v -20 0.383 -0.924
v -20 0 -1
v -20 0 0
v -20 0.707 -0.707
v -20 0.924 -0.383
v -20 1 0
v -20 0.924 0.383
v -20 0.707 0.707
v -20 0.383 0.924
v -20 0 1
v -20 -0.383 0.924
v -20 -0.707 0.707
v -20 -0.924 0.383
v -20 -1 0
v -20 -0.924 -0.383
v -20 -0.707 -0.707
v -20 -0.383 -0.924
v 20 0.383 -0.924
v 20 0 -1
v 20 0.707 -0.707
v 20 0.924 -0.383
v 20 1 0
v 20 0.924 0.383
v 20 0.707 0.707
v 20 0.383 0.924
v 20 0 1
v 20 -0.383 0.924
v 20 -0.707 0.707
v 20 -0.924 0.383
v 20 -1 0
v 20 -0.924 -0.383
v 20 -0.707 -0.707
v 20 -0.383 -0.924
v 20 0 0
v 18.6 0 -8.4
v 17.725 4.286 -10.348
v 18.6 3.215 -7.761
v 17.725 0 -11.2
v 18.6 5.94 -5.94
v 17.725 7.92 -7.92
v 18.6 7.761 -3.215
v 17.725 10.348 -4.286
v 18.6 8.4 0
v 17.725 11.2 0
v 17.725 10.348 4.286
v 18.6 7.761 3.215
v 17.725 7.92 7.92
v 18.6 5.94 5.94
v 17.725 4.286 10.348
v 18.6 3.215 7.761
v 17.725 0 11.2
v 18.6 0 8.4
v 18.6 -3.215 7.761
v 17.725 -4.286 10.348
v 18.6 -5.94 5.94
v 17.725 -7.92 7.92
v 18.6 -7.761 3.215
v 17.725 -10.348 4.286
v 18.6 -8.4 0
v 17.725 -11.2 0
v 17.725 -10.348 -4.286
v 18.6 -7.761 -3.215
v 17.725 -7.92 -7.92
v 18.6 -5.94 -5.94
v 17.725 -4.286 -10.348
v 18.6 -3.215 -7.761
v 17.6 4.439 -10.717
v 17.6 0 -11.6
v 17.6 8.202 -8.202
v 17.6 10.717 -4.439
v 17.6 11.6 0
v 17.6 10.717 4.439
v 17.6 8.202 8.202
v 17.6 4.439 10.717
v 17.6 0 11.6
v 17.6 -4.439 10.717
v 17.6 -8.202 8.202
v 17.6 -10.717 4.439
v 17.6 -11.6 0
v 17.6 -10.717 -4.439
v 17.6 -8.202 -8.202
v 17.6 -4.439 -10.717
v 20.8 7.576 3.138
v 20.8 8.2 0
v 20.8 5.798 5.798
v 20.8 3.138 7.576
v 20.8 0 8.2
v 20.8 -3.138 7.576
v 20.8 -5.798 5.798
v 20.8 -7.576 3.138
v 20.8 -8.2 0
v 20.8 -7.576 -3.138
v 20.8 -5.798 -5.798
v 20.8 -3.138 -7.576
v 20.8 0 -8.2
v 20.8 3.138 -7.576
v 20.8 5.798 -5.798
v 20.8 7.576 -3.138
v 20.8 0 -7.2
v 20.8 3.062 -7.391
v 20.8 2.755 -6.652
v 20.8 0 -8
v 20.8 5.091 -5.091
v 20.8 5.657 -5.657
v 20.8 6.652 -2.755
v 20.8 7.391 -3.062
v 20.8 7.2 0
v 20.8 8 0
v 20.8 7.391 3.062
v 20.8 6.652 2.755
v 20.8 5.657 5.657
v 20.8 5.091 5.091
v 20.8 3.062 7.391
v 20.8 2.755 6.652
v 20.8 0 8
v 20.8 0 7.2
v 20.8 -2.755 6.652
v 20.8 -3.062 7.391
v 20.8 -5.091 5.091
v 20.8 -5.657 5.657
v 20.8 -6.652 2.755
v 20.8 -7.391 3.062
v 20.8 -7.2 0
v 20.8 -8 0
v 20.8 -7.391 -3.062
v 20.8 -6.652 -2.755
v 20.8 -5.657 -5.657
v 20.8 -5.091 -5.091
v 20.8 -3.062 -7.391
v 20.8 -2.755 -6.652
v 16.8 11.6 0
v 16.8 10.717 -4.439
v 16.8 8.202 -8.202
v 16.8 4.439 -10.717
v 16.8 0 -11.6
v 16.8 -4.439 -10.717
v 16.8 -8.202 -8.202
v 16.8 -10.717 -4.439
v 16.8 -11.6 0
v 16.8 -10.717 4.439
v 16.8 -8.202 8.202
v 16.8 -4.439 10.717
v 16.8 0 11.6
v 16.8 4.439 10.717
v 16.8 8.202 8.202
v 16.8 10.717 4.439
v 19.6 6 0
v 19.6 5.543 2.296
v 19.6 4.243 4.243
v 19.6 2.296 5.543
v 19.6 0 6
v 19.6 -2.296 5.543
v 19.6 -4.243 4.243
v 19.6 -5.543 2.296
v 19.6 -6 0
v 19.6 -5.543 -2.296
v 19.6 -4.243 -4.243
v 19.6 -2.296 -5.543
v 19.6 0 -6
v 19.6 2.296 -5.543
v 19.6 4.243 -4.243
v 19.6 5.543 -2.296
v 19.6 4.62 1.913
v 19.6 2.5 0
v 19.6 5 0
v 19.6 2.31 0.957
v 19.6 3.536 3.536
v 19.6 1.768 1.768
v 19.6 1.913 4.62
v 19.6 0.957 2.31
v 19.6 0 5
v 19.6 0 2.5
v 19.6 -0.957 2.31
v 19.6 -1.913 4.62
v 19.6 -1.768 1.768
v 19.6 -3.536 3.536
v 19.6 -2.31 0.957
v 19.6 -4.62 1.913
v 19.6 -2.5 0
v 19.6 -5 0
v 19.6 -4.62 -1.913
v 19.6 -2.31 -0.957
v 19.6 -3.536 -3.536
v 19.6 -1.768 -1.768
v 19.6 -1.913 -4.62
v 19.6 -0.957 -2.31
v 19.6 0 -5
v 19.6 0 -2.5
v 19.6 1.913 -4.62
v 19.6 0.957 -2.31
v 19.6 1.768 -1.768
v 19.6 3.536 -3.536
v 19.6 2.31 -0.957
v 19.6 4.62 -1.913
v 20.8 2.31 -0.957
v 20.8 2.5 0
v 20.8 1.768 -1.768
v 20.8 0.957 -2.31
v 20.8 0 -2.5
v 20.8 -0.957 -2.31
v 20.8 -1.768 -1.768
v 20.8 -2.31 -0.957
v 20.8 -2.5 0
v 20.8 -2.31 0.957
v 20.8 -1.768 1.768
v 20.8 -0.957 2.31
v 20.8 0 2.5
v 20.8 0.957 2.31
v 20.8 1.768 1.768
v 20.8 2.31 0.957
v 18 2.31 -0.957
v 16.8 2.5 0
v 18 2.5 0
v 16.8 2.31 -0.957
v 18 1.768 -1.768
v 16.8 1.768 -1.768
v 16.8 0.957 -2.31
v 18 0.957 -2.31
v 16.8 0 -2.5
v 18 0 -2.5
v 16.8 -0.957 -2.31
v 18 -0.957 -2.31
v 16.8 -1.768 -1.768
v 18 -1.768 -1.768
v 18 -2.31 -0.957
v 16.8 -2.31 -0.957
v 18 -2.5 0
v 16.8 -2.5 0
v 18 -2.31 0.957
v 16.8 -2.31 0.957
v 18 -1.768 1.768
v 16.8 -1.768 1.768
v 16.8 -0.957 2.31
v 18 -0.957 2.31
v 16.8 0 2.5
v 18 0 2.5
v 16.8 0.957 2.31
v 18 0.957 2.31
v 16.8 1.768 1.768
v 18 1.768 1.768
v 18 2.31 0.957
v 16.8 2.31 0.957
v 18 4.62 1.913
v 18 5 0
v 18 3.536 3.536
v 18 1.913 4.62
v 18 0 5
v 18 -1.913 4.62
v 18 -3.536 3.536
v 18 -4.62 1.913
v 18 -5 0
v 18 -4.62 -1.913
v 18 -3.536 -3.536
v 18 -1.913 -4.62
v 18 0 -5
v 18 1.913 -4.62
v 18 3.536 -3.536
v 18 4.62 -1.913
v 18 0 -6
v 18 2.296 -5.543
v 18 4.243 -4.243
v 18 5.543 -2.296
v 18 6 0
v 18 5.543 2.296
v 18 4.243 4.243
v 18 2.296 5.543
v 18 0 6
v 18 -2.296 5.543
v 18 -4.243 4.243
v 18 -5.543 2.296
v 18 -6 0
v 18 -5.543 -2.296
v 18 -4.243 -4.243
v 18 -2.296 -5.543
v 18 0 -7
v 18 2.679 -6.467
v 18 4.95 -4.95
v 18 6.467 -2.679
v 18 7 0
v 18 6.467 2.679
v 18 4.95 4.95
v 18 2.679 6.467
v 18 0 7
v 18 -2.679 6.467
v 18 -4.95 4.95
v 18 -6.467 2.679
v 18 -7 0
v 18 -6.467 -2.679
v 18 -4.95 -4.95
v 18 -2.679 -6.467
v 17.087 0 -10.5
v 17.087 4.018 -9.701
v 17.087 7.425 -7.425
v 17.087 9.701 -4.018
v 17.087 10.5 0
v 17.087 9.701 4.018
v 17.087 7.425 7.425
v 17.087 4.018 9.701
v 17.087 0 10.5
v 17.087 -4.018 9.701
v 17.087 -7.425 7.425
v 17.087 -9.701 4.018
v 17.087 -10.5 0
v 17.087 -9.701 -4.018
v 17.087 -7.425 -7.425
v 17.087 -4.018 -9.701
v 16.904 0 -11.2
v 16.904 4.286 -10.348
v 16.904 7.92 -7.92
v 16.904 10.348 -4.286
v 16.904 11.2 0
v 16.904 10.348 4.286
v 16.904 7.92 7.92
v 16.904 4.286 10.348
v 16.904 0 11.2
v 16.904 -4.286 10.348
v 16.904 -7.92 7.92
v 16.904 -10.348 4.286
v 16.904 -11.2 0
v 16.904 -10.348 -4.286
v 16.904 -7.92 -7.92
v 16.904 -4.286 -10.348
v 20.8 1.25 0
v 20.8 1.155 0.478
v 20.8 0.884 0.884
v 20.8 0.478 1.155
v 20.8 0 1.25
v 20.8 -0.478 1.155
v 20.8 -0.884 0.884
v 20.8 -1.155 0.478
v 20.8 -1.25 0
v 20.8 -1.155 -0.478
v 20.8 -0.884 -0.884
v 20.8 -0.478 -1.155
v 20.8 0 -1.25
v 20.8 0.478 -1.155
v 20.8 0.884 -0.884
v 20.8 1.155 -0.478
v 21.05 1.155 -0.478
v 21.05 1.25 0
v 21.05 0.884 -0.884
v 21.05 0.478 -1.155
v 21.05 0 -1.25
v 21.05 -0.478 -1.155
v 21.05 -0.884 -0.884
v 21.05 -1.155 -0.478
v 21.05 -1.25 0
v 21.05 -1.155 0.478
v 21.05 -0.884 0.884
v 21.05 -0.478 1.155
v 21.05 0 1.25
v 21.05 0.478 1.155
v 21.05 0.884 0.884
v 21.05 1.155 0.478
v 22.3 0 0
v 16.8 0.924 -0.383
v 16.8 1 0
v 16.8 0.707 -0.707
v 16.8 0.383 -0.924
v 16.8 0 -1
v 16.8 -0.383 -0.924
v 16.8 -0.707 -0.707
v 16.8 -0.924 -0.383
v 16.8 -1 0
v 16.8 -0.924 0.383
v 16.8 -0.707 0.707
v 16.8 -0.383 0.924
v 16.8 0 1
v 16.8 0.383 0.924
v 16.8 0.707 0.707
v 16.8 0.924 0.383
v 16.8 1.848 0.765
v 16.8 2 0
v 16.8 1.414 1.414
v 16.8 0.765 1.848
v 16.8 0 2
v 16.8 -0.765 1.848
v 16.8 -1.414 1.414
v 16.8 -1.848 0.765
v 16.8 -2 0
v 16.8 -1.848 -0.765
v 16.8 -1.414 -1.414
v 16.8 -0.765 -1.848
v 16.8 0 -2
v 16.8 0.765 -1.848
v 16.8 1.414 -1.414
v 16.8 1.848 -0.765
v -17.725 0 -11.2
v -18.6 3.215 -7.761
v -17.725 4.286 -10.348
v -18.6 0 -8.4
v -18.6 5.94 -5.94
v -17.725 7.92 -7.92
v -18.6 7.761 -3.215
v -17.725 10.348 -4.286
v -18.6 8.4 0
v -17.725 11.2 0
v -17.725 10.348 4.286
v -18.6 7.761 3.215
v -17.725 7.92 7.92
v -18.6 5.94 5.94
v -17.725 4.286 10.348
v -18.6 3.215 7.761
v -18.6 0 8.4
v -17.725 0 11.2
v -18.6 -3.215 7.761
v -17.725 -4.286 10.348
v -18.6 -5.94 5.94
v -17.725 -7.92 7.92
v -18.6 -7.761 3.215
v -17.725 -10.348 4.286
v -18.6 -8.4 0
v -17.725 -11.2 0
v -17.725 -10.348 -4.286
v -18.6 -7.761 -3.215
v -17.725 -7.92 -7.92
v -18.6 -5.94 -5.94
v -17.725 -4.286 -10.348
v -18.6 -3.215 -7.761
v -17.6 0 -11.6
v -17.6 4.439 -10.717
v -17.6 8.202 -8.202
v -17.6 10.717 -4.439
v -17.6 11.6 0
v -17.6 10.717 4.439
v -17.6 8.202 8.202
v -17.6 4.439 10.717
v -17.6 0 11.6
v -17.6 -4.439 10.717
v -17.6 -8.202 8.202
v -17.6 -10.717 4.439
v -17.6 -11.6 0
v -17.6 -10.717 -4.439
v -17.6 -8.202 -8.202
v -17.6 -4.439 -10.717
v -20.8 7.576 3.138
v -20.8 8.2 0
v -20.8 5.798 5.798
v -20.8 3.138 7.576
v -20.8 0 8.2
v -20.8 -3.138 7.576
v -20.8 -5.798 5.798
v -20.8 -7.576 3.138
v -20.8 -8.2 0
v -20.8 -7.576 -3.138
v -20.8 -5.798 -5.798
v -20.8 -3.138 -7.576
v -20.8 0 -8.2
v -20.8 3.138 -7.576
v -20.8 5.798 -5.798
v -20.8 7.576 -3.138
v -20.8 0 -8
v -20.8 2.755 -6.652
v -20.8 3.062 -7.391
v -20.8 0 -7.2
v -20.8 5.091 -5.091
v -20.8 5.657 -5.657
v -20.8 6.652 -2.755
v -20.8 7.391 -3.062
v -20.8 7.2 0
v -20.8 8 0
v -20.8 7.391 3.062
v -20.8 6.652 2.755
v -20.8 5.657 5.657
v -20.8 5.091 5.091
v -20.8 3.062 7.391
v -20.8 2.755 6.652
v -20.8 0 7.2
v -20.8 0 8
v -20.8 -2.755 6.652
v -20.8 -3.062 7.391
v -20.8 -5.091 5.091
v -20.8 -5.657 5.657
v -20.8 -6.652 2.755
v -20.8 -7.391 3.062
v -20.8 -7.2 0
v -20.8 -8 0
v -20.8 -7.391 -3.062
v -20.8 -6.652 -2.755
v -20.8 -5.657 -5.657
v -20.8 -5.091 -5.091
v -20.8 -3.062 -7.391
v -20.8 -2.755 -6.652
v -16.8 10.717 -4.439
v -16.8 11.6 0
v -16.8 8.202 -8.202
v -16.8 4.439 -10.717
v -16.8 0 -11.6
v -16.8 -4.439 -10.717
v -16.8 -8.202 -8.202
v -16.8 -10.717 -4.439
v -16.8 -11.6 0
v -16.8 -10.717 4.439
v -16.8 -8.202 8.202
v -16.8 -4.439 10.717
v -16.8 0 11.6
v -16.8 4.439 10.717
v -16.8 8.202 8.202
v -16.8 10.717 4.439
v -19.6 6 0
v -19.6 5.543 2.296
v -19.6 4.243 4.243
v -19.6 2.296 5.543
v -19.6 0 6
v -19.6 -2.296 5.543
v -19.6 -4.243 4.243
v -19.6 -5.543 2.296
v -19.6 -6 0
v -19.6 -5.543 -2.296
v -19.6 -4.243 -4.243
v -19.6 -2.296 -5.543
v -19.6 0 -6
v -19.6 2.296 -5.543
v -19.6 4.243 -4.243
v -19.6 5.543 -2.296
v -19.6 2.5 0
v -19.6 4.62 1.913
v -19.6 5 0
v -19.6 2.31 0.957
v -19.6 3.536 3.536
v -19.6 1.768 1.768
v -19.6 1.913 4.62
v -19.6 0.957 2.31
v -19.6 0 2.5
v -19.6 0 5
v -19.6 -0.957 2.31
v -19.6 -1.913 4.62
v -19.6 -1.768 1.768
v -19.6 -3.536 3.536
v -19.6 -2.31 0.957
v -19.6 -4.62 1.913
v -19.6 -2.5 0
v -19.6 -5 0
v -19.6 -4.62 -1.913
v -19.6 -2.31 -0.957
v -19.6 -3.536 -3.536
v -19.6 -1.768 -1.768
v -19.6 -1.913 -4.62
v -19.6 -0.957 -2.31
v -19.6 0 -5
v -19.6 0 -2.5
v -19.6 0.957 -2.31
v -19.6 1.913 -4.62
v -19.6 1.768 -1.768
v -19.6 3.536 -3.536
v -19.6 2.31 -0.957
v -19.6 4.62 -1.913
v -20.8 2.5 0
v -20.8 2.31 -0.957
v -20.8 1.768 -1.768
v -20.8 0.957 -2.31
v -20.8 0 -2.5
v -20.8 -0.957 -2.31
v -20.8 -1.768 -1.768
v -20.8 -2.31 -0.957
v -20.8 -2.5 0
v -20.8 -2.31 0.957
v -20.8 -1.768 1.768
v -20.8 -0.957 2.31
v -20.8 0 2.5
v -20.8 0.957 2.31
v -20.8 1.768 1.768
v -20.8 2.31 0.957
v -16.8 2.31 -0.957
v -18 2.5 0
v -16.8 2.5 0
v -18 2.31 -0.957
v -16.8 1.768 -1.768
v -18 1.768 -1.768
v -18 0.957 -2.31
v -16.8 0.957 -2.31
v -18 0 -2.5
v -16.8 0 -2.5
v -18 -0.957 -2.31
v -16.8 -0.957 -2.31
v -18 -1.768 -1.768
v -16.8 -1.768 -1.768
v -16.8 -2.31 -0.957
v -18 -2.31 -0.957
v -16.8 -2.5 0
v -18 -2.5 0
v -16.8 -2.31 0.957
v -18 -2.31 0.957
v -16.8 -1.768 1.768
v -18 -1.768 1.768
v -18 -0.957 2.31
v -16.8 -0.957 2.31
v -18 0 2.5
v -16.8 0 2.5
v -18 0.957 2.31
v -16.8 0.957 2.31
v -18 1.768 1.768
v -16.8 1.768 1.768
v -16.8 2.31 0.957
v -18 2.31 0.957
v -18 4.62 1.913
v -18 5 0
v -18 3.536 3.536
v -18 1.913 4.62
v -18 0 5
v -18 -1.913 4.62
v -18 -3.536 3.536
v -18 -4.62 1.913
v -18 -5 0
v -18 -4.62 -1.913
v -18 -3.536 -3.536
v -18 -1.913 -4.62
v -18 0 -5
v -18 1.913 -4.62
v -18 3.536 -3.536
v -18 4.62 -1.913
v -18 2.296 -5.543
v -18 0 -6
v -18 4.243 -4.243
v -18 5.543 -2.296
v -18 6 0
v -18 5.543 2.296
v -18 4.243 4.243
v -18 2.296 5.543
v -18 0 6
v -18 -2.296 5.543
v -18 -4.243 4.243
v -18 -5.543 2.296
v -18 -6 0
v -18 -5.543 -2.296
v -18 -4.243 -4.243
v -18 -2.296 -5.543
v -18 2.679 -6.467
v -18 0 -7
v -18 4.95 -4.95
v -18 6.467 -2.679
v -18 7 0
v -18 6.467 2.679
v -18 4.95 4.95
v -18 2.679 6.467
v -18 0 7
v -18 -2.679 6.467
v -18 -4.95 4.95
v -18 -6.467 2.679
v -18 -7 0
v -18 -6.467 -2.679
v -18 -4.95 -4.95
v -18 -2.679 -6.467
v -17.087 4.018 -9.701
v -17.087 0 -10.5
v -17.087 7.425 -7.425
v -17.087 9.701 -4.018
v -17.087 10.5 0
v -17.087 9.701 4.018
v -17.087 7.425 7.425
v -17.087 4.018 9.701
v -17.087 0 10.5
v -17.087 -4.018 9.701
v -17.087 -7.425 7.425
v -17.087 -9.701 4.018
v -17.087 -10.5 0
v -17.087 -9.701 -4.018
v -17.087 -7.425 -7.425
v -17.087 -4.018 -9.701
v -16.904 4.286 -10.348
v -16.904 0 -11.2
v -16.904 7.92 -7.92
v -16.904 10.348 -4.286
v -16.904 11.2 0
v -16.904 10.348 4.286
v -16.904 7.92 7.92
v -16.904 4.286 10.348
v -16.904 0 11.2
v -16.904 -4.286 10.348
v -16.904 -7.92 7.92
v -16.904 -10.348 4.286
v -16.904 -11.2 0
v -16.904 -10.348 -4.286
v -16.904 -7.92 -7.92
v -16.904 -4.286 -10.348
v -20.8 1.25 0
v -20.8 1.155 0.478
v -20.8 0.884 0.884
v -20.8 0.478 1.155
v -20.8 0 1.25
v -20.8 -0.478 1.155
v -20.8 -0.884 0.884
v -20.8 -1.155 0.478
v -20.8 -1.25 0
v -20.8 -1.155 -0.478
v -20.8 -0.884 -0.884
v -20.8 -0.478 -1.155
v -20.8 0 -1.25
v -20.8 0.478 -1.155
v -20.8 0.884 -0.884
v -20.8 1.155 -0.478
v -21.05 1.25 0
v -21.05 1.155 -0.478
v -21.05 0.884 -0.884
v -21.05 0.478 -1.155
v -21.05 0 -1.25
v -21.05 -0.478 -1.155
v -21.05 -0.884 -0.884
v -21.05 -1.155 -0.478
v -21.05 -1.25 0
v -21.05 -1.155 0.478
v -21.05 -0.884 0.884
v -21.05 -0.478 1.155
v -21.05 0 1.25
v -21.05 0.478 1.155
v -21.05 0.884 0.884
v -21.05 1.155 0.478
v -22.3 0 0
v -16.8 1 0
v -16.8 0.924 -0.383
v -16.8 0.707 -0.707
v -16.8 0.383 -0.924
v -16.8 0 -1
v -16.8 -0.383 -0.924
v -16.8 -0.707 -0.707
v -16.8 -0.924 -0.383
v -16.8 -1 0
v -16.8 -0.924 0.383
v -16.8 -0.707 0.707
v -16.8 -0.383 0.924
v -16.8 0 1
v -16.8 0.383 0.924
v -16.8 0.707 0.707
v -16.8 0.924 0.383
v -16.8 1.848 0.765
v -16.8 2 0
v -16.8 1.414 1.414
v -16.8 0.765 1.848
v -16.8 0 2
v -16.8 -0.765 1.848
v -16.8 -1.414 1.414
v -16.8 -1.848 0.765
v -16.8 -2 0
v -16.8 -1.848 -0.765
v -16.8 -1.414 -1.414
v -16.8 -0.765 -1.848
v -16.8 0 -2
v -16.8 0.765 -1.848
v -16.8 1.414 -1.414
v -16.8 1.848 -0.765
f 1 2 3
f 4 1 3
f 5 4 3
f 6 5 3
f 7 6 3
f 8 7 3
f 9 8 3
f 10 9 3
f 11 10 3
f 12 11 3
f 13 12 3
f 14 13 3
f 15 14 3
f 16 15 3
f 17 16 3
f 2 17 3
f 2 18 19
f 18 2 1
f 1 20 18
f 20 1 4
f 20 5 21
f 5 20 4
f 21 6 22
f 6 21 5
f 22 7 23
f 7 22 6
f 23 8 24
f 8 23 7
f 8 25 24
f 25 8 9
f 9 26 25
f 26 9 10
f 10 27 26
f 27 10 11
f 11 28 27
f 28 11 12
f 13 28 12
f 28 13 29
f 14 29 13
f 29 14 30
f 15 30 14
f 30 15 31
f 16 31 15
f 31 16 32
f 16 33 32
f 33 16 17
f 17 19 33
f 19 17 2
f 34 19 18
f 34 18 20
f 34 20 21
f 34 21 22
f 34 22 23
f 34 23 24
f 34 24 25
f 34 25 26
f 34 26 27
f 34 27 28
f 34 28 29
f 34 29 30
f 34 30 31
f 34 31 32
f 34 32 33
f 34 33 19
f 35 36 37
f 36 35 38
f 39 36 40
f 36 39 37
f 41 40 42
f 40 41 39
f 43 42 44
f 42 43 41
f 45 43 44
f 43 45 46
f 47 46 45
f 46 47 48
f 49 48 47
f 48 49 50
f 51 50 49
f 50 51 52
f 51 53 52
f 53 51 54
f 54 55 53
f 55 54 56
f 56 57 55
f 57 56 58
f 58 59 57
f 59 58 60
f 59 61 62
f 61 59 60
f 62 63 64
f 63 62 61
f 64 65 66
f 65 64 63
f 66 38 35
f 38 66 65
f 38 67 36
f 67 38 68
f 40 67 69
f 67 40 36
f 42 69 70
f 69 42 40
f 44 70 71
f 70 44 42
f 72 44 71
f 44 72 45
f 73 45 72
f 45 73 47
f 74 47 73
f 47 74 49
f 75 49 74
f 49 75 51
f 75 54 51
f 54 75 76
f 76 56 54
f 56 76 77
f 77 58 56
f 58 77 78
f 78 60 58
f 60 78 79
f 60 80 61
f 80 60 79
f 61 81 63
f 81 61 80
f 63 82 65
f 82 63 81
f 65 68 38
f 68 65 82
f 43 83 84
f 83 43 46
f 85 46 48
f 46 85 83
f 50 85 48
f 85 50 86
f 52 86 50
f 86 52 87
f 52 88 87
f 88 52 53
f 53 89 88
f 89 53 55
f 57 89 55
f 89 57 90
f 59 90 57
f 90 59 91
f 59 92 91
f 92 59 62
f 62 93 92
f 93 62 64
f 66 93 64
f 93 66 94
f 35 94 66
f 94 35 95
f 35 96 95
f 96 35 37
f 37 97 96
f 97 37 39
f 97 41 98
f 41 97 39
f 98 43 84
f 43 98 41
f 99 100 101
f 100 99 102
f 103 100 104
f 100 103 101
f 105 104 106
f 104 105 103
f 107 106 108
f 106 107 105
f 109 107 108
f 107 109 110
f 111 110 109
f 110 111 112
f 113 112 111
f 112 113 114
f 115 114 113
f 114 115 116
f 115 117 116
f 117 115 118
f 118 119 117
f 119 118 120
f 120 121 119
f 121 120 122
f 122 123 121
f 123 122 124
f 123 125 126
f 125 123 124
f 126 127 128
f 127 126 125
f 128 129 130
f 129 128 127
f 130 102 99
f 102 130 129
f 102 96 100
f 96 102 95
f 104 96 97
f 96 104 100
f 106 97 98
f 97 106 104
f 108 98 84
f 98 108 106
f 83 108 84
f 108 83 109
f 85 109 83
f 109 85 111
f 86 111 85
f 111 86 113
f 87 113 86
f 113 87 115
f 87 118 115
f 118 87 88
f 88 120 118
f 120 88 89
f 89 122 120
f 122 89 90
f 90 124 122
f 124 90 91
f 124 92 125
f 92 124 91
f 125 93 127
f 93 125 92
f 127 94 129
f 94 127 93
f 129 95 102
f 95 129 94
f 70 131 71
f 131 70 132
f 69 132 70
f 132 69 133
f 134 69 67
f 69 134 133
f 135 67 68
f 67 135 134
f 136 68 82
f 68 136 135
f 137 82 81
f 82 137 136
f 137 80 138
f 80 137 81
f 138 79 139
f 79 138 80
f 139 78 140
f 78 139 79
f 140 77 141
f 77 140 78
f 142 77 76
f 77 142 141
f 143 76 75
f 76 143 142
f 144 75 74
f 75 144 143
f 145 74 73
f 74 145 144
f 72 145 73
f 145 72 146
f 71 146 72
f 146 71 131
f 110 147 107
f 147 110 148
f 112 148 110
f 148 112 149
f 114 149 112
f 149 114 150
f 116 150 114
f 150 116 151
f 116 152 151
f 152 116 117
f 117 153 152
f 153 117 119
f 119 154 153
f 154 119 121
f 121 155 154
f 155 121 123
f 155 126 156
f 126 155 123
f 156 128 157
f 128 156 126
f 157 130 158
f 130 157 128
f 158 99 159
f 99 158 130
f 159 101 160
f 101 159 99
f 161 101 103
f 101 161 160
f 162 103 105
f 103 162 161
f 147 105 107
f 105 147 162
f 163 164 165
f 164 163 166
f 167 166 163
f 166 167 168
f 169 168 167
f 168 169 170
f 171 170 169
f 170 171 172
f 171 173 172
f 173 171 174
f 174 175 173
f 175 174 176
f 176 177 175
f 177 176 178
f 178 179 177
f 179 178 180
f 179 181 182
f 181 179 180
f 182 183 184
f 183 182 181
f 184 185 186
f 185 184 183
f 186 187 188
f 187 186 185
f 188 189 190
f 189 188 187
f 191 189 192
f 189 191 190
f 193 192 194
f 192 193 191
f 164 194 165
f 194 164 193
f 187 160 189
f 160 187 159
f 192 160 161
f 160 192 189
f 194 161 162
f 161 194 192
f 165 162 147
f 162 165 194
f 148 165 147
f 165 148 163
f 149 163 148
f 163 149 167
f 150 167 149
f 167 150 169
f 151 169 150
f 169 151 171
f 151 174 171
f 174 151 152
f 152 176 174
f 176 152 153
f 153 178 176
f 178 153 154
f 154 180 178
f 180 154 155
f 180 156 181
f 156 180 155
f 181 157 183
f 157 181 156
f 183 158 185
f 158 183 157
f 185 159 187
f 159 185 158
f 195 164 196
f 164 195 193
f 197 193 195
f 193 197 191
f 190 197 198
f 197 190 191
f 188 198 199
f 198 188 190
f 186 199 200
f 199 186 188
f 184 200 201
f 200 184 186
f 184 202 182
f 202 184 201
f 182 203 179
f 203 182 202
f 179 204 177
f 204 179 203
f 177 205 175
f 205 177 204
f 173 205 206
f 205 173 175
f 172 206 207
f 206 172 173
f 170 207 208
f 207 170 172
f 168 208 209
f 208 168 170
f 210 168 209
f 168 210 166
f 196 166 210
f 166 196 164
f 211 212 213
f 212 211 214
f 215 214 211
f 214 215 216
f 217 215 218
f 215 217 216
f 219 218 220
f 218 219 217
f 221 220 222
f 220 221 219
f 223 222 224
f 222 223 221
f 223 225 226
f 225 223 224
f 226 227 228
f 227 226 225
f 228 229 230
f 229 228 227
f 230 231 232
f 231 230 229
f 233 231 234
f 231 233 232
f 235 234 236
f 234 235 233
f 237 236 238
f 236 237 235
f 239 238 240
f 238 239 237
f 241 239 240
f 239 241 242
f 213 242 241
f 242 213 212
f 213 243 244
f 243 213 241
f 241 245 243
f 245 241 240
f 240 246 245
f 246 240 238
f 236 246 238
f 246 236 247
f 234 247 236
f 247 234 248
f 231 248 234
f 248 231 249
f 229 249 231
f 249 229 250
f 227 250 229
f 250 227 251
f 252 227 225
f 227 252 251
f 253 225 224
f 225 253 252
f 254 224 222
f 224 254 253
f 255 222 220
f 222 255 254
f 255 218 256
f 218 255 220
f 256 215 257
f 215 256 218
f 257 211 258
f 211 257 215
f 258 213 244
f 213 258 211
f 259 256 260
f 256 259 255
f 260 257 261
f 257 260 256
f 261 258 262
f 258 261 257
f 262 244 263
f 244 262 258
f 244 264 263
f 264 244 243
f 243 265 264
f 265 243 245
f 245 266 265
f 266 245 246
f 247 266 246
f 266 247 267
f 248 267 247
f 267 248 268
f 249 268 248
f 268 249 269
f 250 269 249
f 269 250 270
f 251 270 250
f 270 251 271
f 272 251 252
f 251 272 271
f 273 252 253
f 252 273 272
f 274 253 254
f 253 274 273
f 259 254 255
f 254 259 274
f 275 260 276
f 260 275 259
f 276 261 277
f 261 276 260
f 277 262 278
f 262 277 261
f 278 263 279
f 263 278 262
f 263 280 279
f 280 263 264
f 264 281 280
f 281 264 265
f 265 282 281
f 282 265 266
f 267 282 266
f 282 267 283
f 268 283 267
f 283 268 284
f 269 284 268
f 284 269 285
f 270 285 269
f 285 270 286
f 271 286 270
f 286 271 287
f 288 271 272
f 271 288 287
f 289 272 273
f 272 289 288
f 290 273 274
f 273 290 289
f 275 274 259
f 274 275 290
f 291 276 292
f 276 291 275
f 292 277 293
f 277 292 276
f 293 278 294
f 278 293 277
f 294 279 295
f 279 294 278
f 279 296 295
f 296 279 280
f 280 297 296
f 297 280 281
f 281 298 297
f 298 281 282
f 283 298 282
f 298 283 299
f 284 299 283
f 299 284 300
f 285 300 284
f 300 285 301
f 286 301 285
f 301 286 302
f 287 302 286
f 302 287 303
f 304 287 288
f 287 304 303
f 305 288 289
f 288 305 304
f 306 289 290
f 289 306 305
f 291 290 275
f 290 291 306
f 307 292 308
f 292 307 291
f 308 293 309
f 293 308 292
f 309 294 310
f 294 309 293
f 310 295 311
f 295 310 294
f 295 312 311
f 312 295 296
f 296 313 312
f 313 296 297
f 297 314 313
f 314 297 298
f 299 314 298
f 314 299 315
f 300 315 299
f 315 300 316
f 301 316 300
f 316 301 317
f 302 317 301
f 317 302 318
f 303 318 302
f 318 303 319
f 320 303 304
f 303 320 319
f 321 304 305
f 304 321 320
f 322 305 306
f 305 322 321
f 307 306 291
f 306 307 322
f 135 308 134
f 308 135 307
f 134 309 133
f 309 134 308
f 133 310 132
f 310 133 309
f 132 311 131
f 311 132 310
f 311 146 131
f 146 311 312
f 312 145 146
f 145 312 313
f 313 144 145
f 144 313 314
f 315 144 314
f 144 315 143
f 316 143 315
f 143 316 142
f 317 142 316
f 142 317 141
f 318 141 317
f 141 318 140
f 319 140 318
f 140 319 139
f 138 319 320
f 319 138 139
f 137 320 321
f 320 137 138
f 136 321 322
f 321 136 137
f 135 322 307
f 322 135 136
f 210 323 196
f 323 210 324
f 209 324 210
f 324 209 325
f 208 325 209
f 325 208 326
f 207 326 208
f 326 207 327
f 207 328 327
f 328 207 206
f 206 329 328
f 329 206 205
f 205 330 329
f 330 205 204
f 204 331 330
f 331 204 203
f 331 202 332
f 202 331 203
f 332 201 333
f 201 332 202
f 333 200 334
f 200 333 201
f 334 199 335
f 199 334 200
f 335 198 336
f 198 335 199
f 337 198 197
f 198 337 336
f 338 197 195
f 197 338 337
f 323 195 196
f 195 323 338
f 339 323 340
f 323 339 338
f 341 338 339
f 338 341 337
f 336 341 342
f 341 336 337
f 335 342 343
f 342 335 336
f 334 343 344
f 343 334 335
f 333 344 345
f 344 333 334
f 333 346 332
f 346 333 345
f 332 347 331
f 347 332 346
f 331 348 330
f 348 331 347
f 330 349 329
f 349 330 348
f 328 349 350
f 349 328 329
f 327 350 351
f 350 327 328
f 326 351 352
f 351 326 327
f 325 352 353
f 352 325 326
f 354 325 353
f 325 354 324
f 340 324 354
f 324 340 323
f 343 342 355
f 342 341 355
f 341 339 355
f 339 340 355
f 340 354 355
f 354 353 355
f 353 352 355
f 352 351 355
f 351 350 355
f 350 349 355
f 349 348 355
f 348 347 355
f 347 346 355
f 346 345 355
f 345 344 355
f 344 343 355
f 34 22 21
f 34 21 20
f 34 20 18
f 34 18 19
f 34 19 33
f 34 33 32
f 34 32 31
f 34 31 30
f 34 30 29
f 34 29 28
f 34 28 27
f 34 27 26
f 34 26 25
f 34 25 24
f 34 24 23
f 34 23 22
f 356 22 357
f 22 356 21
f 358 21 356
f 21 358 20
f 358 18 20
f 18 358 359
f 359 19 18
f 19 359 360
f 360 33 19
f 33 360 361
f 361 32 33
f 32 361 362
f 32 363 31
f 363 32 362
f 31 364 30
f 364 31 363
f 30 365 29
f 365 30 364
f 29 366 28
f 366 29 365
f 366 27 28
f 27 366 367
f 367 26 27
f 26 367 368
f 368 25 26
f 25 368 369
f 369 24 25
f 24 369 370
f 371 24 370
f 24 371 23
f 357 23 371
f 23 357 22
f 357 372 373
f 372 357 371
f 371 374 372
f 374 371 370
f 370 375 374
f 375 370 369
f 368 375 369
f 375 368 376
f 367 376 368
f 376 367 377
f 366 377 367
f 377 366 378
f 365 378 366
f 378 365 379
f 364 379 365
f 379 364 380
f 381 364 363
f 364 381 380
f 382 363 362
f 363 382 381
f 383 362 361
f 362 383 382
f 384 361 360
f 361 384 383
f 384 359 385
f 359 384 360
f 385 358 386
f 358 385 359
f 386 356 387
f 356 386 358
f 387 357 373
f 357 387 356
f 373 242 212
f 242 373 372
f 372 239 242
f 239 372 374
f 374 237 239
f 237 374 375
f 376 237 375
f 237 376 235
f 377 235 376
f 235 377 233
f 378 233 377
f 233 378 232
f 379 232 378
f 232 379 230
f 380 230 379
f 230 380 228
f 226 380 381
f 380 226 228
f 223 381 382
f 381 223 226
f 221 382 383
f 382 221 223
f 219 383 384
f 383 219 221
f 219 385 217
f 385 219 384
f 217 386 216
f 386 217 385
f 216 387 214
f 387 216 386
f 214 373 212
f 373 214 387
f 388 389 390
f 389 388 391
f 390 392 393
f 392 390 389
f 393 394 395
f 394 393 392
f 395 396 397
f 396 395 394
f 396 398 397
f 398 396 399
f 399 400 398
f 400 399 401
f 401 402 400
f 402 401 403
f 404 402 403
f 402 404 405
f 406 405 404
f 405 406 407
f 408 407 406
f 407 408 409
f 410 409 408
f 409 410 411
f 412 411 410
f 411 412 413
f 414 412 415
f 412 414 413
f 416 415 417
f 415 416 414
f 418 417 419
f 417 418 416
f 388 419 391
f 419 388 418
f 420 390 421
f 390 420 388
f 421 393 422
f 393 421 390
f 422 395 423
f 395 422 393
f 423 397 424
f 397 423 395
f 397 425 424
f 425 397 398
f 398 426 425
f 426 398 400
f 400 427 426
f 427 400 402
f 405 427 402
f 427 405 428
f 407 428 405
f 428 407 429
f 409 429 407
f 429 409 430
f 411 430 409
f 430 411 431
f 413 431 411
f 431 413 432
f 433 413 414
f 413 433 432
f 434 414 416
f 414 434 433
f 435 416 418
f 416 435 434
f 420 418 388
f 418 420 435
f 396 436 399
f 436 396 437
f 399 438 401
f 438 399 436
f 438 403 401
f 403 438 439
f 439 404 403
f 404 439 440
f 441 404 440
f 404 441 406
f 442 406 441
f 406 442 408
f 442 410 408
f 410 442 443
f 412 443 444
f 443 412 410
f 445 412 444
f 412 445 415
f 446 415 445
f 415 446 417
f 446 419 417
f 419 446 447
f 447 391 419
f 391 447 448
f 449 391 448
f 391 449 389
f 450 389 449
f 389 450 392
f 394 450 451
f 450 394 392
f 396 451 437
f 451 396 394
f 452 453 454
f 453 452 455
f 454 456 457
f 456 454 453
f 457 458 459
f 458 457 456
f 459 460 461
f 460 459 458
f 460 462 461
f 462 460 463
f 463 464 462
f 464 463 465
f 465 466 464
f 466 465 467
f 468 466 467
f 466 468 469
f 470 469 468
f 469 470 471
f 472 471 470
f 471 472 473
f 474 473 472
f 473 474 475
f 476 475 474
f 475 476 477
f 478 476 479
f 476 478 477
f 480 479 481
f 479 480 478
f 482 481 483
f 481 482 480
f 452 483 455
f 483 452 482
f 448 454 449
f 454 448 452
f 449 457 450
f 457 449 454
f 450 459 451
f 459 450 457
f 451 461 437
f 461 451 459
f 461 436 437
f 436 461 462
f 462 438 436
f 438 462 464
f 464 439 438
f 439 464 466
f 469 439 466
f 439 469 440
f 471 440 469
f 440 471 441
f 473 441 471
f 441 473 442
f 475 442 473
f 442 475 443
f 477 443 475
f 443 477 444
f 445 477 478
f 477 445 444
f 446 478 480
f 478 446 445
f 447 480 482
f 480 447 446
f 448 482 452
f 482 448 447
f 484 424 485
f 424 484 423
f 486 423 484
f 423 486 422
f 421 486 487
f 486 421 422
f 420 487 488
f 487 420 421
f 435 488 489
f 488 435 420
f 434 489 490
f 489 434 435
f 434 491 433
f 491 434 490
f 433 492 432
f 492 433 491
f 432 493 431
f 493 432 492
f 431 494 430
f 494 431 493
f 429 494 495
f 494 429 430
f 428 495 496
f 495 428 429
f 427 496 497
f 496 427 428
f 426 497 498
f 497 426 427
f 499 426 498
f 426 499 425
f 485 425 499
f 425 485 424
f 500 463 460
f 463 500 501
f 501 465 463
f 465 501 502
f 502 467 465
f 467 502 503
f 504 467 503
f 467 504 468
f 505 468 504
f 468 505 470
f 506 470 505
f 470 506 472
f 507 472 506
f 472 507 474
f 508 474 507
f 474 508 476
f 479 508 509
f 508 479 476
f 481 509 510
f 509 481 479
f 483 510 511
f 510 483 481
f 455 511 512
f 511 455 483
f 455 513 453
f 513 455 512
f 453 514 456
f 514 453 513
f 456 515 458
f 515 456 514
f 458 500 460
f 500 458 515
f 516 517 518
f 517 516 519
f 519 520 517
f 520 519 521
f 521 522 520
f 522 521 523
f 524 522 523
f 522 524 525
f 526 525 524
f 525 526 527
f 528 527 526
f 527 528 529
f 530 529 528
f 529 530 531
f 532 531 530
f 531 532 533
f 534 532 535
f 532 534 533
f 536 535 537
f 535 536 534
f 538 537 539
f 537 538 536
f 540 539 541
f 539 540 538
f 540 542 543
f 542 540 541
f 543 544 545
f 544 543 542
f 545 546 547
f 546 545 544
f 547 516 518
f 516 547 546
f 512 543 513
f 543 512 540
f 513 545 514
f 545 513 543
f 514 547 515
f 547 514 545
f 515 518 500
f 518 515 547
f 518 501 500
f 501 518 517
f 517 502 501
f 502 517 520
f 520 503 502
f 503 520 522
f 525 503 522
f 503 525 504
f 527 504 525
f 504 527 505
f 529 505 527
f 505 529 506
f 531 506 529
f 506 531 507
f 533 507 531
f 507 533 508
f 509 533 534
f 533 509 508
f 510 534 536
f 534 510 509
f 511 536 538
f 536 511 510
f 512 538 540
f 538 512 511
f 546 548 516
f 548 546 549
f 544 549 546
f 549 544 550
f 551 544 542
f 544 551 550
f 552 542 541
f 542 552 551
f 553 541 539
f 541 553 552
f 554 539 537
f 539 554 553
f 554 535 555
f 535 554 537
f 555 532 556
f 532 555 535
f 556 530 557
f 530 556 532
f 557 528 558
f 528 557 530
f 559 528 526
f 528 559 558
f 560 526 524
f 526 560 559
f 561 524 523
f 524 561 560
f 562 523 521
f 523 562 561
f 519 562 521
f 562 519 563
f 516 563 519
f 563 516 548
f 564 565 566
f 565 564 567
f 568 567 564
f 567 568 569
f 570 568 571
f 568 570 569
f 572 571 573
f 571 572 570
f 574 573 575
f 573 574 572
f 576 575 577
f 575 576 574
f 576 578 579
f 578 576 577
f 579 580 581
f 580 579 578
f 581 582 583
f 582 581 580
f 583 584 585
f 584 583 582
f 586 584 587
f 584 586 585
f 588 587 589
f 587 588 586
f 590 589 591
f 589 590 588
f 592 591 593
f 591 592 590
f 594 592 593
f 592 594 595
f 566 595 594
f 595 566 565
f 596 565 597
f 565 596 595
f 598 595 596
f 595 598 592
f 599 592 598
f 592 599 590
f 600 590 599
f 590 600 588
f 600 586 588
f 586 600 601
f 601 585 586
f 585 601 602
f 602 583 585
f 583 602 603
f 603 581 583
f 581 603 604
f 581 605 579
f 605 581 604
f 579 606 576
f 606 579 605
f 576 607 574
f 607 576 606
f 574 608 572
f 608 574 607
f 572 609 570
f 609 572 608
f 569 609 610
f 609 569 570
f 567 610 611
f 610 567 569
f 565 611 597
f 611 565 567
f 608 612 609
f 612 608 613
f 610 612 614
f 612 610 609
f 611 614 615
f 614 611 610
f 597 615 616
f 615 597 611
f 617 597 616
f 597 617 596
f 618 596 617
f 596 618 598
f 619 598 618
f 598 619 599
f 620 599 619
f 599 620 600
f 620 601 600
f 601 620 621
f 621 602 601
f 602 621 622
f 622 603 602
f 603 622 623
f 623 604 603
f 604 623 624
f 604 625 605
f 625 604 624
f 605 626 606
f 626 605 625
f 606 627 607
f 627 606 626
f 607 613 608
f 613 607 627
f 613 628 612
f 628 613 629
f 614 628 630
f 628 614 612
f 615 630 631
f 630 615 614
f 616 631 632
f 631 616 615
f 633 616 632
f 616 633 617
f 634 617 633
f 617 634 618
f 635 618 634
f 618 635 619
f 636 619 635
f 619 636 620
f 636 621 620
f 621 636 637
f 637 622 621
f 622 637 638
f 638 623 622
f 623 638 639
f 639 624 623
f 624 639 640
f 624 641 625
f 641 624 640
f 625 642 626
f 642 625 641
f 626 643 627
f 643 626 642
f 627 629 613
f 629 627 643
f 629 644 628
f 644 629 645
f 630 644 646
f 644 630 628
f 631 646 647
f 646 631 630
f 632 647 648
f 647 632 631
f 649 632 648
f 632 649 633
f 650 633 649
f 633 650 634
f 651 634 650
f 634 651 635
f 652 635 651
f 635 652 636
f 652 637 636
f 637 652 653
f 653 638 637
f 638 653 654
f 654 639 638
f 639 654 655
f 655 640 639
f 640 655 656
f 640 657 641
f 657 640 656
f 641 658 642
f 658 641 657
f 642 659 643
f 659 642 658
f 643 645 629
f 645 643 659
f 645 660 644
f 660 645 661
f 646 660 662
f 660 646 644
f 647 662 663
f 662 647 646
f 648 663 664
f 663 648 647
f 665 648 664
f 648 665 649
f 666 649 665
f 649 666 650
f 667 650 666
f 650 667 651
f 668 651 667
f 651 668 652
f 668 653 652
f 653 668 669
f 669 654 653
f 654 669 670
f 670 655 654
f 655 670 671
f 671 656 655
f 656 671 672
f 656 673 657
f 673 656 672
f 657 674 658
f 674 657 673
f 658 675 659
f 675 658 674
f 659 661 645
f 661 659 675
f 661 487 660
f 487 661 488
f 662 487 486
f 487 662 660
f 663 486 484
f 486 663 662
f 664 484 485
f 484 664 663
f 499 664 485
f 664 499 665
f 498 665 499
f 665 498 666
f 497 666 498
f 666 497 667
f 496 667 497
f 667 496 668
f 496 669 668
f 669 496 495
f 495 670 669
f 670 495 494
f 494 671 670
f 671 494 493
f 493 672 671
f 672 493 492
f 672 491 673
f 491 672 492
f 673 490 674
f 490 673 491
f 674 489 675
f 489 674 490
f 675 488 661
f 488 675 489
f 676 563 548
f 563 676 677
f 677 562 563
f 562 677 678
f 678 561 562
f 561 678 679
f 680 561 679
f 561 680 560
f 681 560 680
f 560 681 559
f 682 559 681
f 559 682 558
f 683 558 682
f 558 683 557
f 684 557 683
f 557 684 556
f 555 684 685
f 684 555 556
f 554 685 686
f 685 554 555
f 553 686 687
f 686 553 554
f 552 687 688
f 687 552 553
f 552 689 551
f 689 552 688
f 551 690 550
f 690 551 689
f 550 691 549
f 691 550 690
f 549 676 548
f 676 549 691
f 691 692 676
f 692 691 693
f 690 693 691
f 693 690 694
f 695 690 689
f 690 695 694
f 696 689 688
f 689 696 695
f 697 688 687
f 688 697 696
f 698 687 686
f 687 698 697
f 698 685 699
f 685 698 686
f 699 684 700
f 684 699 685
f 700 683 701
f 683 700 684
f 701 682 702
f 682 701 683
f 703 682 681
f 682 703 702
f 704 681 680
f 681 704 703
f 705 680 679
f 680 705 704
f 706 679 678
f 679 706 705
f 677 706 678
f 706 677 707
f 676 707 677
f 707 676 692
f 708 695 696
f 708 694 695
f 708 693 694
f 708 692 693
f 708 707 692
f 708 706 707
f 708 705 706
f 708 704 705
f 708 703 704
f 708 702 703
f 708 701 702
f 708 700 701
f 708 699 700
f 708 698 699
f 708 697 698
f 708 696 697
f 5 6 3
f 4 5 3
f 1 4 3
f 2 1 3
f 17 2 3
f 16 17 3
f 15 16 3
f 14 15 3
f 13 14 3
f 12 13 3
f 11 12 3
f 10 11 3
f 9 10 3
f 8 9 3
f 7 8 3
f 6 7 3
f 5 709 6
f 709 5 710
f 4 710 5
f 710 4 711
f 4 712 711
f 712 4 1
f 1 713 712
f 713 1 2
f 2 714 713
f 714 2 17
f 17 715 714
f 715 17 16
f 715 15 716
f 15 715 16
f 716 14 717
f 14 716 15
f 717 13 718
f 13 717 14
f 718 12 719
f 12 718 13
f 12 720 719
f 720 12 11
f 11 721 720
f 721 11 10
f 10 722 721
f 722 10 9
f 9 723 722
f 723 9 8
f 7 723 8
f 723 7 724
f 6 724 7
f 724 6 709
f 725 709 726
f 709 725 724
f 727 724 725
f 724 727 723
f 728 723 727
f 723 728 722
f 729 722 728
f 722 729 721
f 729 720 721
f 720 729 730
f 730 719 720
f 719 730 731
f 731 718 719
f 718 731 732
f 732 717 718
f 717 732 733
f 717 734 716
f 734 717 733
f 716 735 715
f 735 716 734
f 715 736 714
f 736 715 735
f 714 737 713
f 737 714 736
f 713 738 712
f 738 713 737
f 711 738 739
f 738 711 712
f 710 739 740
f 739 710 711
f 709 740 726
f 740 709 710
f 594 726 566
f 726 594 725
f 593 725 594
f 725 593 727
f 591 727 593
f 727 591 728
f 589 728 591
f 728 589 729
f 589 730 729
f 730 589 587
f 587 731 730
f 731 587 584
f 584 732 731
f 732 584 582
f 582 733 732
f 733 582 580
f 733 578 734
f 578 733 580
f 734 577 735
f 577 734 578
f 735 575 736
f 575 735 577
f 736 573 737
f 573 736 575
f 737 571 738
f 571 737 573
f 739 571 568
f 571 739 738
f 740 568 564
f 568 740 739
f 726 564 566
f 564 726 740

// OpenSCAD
use <../lib.scad>
use <57877.scad>
use <57878.scad>
function ldraw_lib__57877c01() = [
// 0 ~Axle Steel  5 x 100 LDU with Two Train Wheels with Closed Centres
// 0 Name: 57877c01.dat
// 0 Author: Max Martin Richter [MMR1988]
// 0 !LDRAW_ORG Shortcut UPDATE 2013-02
// 0 !LICENSE Licensed under CC BY 2.0 and CC BY 4.0 : see CAreadme.txt
// 
// 0 BFC CERTIFY CCW
  [0,"BFC","CERTIFY"],
  [0,"BFC","CCW"],
// 
// 0 !CATEGORY Wheel
// 
// 0 !HISTORY 2013-12-23 [PTadmin] Official Update 2013-02
// 
// 
// 1 494 0 0 0 1 0 0 0 1 0 0 0 1 57877.dat
  [1,494,0,0,0,1,0,0,0,1,0,0,0,1, ldraw_lib__57877()],
// 1 16 50 0 0 0 0 -1 0 1 0 1 0 0 57878.dat
  [1,16,50,0,0,0,0,-1,0,1,0,1,0,0, ldraw_lib__57878()],
// 1 16 -50 0 0 0 0 1 0 1 0 1 0 0 57878.dat
  [1,16,-50,0,0,0,0,1,0,1,0,1,0,0, ldraw_lib__57878()],
];
makepoly(ldraw_lib__57877c01(), line=0.2);
